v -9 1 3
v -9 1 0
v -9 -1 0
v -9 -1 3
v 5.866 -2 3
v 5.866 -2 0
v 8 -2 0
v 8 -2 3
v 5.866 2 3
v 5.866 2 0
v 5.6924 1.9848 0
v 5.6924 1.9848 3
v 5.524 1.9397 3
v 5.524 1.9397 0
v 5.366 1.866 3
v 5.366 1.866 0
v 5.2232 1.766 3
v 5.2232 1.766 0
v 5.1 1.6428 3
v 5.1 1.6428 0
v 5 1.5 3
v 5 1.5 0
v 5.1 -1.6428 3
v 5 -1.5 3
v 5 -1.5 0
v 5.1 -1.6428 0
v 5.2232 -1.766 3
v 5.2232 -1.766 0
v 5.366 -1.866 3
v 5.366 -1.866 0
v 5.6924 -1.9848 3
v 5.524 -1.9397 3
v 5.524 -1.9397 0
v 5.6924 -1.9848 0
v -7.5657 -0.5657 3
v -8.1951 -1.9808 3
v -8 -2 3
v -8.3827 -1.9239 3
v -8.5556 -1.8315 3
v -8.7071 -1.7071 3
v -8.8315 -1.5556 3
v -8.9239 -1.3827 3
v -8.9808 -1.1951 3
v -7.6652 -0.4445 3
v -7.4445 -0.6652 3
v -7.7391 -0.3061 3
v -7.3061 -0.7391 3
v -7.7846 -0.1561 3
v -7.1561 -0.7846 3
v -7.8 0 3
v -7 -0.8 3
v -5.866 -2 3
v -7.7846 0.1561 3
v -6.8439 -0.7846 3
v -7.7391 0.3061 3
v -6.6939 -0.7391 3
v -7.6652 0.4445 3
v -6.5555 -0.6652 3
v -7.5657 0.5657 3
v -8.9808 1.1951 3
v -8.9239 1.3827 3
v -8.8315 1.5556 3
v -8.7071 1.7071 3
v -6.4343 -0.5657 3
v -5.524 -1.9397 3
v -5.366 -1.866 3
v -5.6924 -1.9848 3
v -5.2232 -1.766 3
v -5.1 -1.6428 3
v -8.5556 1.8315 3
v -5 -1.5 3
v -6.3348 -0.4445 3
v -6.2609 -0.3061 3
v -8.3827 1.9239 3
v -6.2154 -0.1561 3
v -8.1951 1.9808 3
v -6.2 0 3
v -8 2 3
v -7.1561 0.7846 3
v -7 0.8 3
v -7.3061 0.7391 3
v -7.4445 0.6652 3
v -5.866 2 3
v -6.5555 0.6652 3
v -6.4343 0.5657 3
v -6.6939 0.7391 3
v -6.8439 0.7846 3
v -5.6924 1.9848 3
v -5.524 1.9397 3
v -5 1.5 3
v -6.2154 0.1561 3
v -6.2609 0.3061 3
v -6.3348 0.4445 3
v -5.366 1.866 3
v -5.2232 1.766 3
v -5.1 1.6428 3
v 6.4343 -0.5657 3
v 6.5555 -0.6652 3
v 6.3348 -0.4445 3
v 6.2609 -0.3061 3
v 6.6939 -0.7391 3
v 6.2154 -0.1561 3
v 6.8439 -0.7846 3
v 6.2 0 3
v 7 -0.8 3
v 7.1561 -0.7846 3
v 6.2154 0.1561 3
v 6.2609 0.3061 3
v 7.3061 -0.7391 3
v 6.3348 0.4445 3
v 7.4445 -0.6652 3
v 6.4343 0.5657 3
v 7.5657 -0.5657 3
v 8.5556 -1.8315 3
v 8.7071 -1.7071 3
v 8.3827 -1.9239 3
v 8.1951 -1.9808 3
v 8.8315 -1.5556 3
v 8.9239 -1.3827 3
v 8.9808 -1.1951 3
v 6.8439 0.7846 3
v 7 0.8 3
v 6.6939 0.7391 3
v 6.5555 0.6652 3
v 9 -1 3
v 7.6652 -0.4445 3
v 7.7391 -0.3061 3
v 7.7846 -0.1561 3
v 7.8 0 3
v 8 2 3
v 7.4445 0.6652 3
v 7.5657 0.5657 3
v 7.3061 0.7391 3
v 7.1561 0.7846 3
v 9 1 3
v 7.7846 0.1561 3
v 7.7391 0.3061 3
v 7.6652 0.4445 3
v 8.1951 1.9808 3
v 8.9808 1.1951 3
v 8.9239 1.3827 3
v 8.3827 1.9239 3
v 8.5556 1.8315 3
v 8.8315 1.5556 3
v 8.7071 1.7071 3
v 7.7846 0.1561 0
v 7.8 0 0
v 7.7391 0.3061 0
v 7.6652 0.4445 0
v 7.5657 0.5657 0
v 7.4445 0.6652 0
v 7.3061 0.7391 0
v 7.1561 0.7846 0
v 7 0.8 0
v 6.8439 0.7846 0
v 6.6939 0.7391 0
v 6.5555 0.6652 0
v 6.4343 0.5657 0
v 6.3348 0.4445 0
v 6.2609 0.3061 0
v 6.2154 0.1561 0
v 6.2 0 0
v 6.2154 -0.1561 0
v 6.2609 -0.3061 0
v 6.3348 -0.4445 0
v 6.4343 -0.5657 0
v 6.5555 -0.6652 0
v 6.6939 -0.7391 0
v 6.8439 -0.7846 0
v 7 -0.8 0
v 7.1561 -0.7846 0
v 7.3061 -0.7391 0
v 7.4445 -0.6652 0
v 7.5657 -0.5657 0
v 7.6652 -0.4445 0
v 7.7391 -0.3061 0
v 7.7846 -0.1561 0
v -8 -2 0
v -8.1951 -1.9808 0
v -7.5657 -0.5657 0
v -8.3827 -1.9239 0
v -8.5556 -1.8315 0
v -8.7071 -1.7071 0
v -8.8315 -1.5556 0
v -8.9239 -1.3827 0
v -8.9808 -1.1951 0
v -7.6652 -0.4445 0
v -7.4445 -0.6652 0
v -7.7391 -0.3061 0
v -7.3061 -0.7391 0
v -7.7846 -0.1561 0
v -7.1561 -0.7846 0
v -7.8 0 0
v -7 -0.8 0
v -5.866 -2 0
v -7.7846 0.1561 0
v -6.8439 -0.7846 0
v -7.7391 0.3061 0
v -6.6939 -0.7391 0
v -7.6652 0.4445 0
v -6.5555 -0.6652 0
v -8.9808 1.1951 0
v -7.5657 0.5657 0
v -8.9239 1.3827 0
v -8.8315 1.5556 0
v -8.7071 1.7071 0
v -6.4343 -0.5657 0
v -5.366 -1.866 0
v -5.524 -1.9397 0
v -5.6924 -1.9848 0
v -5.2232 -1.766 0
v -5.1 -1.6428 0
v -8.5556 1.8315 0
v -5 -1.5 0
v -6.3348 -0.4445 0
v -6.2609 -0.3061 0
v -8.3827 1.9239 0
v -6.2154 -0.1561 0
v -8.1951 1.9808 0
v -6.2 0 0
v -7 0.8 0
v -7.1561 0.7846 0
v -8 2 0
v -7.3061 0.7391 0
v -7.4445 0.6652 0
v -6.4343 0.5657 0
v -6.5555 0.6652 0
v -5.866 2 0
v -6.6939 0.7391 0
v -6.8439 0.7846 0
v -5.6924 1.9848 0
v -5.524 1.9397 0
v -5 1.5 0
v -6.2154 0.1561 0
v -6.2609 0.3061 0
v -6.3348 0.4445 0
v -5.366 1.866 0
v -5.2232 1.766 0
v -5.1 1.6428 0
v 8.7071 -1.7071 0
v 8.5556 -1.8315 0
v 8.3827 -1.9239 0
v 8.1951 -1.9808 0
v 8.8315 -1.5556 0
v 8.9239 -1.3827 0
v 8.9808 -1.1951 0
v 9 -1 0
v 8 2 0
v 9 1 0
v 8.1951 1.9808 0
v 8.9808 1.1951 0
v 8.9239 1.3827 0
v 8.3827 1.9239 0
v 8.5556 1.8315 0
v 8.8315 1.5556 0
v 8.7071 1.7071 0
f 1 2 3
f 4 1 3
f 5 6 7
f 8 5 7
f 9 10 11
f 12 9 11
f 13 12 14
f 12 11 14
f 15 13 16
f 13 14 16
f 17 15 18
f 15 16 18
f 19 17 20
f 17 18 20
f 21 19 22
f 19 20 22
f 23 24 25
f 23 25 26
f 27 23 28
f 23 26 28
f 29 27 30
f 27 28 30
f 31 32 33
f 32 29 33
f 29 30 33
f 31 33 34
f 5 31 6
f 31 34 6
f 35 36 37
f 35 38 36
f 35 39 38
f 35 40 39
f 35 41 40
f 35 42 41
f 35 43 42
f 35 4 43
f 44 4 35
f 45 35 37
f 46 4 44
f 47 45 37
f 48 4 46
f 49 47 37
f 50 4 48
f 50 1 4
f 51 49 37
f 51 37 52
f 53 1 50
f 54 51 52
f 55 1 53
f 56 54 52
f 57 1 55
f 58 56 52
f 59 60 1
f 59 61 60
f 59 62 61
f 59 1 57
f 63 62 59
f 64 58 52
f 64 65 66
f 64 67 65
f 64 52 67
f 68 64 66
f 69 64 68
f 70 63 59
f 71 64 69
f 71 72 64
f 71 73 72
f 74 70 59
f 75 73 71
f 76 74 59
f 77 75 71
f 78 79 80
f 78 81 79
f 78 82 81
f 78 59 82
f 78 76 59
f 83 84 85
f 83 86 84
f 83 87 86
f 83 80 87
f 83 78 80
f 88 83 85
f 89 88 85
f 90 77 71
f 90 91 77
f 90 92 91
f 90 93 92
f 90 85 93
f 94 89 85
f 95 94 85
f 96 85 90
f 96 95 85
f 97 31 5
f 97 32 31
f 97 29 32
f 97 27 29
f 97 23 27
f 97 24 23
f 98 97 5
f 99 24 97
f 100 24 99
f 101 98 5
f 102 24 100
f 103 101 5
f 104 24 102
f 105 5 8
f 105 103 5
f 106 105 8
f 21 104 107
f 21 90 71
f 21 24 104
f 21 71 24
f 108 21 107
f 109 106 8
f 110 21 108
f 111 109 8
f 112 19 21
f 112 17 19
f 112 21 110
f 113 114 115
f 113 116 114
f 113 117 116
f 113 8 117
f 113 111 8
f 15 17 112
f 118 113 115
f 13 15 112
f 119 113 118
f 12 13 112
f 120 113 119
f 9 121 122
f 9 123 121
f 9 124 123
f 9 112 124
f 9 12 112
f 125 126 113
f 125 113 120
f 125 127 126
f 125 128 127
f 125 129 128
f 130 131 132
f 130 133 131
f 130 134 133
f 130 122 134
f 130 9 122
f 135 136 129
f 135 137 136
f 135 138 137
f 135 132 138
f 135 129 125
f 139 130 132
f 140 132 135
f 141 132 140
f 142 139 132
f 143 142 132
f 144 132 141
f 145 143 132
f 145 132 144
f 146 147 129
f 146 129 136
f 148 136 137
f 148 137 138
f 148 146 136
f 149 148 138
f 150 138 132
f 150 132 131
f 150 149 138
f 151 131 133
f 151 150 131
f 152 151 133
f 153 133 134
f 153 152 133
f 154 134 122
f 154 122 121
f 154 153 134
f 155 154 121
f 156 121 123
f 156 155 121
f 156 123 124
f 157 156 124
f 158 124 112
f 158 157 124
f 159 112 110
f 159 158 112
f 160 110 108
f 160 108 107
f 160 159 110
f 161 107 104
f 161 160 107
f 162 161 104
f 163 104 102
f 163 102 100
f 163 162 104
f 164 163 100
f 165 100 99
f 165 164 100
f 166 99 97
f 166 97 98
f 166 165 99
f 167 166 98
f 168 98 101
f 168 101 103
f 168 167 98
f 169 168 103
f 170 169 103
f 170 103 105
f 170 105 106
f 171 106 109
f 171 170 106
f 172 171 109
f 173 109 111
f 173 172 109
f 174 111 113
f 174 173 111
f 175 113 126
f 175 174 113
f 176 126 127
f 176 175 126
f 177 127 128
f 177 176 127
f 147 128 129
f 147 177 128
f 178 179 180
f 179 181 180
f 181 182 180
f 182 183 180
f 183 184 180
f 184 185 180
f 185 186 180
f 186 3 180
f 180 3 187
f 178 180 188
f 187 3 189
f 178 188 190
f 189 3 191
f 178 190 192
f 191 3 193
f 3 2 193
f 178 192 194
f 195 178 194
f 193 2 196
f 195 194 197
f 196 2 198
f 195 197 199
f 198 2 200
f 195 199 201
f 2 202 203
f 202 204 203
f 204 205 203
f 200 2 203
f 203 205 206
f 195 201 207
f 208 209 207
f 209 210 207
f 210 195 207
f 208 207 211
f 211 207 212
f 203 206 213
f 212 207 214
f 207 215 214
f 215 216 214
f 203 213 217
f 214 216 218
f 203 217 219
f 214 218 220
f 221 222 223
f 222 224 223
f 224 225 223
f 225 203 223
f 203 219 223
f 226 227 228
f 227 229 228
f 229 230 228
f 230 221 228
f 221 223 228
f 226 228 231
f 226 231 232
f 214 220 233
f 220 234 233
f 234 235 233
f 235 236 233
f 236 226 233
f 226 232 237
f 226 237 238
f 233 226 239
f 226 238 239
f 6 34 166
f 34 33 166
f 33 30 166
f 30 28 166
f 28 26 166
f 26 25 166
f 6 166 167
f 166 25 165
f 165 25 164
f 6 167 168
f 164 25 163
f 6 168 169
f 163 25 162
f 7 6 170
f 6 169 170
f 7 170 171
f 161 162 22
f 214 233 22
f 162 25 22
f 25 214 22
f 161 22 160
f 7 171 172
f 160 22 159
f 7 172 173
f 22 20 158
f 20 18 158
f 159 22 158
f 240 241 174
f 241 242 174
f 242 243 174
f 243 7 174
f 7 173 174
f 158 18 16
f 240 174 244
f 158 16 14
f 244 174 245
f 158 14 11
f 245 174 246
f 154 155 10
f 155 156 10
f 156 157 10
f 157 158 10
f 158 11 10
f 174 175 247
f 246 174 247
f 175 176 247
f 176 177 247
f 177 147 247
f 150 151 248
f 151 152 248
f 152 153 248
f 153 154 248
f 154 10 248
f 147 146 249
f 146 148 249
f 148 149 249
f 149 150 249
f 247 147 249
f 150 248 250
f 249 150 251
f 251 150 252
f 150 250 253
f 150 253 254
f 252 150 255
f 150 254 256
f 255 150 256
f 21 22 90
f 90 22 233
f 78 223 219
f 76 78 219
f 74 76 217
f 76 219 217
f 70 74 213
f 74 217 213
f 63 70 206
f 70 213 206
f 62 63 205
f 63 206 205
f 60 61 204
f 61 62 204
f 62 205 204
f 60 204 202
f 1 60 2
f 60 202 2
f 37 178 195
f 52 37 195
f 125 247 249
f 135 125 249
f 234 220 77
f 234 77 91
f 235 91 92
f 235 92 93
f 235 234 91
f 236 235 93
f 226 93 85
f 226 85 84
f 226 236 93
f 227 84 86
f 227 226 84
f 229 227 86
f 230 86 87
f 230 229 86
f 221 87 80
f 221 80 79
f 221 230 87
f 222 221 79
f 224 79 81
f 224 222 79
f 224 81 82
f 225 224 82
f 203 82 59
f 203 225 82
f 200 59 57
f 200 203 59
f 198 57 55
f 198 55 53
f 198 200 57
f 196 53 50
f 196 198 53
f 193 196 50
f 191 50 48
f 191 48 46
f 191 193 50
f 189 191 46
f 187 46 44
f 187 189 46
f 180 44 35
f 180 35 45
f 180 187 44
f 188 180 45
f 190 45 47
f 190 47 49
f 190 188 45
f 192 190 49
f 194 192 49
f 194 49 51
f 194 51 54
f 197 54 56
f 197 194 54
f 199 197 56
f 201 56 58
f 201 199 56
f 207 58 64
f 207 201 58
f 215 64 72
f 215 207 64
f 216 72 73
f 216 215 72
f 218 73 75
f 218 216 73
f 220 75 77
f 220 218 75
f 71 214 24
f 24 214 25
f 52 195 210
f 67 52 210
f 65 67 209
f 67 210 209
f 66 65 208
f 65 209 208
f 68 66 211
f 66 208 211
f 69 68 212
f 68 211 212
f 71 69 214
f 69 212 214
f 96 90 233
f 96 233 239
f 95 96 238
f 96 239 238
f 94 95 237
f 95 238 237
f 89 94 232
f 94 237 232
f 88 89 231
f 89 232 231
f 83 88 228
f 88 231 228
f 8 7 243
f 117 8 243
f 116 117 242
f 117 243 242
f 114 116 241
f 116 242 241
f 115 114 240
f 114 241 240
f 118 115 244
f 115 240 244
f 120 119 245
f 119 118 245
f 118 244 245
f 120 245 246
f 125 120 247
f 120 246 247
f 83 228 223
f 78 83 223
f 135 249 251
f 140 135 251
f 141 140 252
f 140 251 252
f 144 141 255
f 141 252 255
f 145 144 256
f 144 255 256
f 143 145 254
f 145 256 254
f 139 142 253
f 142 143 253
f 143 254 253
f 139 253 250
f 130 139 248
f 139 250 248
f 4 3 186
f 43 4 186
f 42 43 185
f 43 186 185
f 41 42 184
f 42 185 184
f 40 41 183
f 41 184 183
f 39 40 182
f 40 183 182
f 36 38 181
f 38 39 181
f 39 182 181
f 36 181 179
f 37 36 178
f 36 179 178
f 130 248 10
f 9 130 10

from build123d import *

# Parameters (mm, degrees)
SKETCH1_R           = 0.8
BOSS_EXTRUDE1_DEPTH = 3
FILLET1_R           = 1


with BuildPart() as part:
    # Sketch1 → Boss-Extrude1 (new body)
    with BuildSketch(Plane.XY):
        Polygon((5, -2), (9, -2), (9, 2), (5, 2), (5, 1.5), (-5, 1.5), (-5, 2), (-9, 2), (-9, -2), (-5, -2), (-5, -1.5), (5, -1.5), align=None)
        with Locations((-7, 0)):
            Circle(SKETCH1_R, mode=Mode.SUBTRACT)
        with Locations((7, 0)):
            Circle(SKETCH1_R, mode=Mode.SUBTRACT)
    extrude(amount=BOSS_EXTRUDE1_DEPTH)

    # Fillet1
    # the kernel refuses this fillet: 1 mm, written as the material it takes off along each edge
    with BuildSketch(Plane(origin=(5, -2, -2.165063509), x_dir=(1, 0, 0), z_dir=(0, 0, 1))) as fillet1_piece_1:
        with BuildLine():
            CenterArc((0.866025404, 1), FILLET1_R, 210, 60)
            Line((0, 0.5), (-0.017320508, 0.49))
            ThreePointArc((-0.017320508, 0.49), (-0.02, 0.25), (-0.02, 0))
            Line((-0.02, 0), (0, -0.02))
            Line((0, -0.02), (0.866025404, -0.02))
            Line((0.866025404, -0.02), (0.866025404, 0))
        make_face()
    extrude(amount=7.330127019, mode=Mode.SUBTRACT)
    with BuildSketch(Plane(origin=(9, -2, -2.5), x_dir=(-1, 0, 0), z_dir=(0, 0, 1)), Plane(origin=(9, 2, -2.5), x_dir=(0, -1, 0), z_dir=(0, 0, 1)), Plane(origin=(-9, -2, -2.5), x_dir=(0, 1, 0), z_dir=(0, 0, 1)), Plane(origin=(-9, 2, -2.5), x_dir=(1, 0, 0), z_dir=(0, 0, 1))) as fillet1_piece_2:
        with BuildLine():
            CenterArc((FILLET1_R, -FILLET1_R), FILLET1_R, 90, 90)
            Line((0, -FILLET1_R), (-FILLET1_R * 0.02, -FILLET1_R))
            Line((-FILLET1_R * 0.02, -FILLET1_R), (-FILLET1_R * 0.02, FILLET1_R * 0.02))
            Line((-FILLET1_R * 0.02, FILLET1_R * 0.02), (FILLET1_R, FILLET1_R * 0.02))
            Line((FILLET1_R, FILLET1_R * 0.02), (FILLET1_R, 0))
        make_face()
    extrude(amount=8, mode=Mode.SUBTRACT)
    with BuildSketch(Plane(origin=(5, 2, -2.165063509), x_dir=(1, 0, 0), z_dir=(0, 0, 1)), Plane(origin=(-5, -2, -2.165063509), x_dir=(-1, 0, 0), z_dir=(0, 0, 1))) as fillet1_piece_3:
        with BuildLine():
            CenterArc((0.866025404, -1), FILLET1_R, 90, 60)
            Line((0, -0.5), (-0.017320508, -0.49))
            ThreePointArc((-0.017320508, -0.49), (-0.02, -0.25), (-0.02, 0))
            Line((-0.02, 0), (0, 0.02))
            Line((0, 0.02), (0.866025404, 0.02))
            Line((0.866025404, 0.02), (0.866025404, 0))
        make_face()
    extrude(amount=7.330127019, mode=Mode.SUBTRACT)
    with BuildSketch(Plane(origin=(-5, 2, -2.165063509), x_dir=(0, -1, 0), z_dir=(0, 0, 1))) as fillet1_piece_4:
        with BuildLine():
            CenterArc((1, -0.866025404), FILLET1_R, 120, 60)
            Line((0, -0.866025404), (-0.02, -0.866025404))
            Line((-0.02, -0.866025404), (-0.02, 0))
            Line((-0.02, 0), (0, 0.02))
            ThreePointArc((0, 0.02), (0.25, 0.02), (0.49, 0.017320508))
            Line((0.49, 0.017320508), (0.5, 0))
        make_face()
    extrude(amount=7.330127019, mode=Mode.SUBTRACT)


solid = part.part
